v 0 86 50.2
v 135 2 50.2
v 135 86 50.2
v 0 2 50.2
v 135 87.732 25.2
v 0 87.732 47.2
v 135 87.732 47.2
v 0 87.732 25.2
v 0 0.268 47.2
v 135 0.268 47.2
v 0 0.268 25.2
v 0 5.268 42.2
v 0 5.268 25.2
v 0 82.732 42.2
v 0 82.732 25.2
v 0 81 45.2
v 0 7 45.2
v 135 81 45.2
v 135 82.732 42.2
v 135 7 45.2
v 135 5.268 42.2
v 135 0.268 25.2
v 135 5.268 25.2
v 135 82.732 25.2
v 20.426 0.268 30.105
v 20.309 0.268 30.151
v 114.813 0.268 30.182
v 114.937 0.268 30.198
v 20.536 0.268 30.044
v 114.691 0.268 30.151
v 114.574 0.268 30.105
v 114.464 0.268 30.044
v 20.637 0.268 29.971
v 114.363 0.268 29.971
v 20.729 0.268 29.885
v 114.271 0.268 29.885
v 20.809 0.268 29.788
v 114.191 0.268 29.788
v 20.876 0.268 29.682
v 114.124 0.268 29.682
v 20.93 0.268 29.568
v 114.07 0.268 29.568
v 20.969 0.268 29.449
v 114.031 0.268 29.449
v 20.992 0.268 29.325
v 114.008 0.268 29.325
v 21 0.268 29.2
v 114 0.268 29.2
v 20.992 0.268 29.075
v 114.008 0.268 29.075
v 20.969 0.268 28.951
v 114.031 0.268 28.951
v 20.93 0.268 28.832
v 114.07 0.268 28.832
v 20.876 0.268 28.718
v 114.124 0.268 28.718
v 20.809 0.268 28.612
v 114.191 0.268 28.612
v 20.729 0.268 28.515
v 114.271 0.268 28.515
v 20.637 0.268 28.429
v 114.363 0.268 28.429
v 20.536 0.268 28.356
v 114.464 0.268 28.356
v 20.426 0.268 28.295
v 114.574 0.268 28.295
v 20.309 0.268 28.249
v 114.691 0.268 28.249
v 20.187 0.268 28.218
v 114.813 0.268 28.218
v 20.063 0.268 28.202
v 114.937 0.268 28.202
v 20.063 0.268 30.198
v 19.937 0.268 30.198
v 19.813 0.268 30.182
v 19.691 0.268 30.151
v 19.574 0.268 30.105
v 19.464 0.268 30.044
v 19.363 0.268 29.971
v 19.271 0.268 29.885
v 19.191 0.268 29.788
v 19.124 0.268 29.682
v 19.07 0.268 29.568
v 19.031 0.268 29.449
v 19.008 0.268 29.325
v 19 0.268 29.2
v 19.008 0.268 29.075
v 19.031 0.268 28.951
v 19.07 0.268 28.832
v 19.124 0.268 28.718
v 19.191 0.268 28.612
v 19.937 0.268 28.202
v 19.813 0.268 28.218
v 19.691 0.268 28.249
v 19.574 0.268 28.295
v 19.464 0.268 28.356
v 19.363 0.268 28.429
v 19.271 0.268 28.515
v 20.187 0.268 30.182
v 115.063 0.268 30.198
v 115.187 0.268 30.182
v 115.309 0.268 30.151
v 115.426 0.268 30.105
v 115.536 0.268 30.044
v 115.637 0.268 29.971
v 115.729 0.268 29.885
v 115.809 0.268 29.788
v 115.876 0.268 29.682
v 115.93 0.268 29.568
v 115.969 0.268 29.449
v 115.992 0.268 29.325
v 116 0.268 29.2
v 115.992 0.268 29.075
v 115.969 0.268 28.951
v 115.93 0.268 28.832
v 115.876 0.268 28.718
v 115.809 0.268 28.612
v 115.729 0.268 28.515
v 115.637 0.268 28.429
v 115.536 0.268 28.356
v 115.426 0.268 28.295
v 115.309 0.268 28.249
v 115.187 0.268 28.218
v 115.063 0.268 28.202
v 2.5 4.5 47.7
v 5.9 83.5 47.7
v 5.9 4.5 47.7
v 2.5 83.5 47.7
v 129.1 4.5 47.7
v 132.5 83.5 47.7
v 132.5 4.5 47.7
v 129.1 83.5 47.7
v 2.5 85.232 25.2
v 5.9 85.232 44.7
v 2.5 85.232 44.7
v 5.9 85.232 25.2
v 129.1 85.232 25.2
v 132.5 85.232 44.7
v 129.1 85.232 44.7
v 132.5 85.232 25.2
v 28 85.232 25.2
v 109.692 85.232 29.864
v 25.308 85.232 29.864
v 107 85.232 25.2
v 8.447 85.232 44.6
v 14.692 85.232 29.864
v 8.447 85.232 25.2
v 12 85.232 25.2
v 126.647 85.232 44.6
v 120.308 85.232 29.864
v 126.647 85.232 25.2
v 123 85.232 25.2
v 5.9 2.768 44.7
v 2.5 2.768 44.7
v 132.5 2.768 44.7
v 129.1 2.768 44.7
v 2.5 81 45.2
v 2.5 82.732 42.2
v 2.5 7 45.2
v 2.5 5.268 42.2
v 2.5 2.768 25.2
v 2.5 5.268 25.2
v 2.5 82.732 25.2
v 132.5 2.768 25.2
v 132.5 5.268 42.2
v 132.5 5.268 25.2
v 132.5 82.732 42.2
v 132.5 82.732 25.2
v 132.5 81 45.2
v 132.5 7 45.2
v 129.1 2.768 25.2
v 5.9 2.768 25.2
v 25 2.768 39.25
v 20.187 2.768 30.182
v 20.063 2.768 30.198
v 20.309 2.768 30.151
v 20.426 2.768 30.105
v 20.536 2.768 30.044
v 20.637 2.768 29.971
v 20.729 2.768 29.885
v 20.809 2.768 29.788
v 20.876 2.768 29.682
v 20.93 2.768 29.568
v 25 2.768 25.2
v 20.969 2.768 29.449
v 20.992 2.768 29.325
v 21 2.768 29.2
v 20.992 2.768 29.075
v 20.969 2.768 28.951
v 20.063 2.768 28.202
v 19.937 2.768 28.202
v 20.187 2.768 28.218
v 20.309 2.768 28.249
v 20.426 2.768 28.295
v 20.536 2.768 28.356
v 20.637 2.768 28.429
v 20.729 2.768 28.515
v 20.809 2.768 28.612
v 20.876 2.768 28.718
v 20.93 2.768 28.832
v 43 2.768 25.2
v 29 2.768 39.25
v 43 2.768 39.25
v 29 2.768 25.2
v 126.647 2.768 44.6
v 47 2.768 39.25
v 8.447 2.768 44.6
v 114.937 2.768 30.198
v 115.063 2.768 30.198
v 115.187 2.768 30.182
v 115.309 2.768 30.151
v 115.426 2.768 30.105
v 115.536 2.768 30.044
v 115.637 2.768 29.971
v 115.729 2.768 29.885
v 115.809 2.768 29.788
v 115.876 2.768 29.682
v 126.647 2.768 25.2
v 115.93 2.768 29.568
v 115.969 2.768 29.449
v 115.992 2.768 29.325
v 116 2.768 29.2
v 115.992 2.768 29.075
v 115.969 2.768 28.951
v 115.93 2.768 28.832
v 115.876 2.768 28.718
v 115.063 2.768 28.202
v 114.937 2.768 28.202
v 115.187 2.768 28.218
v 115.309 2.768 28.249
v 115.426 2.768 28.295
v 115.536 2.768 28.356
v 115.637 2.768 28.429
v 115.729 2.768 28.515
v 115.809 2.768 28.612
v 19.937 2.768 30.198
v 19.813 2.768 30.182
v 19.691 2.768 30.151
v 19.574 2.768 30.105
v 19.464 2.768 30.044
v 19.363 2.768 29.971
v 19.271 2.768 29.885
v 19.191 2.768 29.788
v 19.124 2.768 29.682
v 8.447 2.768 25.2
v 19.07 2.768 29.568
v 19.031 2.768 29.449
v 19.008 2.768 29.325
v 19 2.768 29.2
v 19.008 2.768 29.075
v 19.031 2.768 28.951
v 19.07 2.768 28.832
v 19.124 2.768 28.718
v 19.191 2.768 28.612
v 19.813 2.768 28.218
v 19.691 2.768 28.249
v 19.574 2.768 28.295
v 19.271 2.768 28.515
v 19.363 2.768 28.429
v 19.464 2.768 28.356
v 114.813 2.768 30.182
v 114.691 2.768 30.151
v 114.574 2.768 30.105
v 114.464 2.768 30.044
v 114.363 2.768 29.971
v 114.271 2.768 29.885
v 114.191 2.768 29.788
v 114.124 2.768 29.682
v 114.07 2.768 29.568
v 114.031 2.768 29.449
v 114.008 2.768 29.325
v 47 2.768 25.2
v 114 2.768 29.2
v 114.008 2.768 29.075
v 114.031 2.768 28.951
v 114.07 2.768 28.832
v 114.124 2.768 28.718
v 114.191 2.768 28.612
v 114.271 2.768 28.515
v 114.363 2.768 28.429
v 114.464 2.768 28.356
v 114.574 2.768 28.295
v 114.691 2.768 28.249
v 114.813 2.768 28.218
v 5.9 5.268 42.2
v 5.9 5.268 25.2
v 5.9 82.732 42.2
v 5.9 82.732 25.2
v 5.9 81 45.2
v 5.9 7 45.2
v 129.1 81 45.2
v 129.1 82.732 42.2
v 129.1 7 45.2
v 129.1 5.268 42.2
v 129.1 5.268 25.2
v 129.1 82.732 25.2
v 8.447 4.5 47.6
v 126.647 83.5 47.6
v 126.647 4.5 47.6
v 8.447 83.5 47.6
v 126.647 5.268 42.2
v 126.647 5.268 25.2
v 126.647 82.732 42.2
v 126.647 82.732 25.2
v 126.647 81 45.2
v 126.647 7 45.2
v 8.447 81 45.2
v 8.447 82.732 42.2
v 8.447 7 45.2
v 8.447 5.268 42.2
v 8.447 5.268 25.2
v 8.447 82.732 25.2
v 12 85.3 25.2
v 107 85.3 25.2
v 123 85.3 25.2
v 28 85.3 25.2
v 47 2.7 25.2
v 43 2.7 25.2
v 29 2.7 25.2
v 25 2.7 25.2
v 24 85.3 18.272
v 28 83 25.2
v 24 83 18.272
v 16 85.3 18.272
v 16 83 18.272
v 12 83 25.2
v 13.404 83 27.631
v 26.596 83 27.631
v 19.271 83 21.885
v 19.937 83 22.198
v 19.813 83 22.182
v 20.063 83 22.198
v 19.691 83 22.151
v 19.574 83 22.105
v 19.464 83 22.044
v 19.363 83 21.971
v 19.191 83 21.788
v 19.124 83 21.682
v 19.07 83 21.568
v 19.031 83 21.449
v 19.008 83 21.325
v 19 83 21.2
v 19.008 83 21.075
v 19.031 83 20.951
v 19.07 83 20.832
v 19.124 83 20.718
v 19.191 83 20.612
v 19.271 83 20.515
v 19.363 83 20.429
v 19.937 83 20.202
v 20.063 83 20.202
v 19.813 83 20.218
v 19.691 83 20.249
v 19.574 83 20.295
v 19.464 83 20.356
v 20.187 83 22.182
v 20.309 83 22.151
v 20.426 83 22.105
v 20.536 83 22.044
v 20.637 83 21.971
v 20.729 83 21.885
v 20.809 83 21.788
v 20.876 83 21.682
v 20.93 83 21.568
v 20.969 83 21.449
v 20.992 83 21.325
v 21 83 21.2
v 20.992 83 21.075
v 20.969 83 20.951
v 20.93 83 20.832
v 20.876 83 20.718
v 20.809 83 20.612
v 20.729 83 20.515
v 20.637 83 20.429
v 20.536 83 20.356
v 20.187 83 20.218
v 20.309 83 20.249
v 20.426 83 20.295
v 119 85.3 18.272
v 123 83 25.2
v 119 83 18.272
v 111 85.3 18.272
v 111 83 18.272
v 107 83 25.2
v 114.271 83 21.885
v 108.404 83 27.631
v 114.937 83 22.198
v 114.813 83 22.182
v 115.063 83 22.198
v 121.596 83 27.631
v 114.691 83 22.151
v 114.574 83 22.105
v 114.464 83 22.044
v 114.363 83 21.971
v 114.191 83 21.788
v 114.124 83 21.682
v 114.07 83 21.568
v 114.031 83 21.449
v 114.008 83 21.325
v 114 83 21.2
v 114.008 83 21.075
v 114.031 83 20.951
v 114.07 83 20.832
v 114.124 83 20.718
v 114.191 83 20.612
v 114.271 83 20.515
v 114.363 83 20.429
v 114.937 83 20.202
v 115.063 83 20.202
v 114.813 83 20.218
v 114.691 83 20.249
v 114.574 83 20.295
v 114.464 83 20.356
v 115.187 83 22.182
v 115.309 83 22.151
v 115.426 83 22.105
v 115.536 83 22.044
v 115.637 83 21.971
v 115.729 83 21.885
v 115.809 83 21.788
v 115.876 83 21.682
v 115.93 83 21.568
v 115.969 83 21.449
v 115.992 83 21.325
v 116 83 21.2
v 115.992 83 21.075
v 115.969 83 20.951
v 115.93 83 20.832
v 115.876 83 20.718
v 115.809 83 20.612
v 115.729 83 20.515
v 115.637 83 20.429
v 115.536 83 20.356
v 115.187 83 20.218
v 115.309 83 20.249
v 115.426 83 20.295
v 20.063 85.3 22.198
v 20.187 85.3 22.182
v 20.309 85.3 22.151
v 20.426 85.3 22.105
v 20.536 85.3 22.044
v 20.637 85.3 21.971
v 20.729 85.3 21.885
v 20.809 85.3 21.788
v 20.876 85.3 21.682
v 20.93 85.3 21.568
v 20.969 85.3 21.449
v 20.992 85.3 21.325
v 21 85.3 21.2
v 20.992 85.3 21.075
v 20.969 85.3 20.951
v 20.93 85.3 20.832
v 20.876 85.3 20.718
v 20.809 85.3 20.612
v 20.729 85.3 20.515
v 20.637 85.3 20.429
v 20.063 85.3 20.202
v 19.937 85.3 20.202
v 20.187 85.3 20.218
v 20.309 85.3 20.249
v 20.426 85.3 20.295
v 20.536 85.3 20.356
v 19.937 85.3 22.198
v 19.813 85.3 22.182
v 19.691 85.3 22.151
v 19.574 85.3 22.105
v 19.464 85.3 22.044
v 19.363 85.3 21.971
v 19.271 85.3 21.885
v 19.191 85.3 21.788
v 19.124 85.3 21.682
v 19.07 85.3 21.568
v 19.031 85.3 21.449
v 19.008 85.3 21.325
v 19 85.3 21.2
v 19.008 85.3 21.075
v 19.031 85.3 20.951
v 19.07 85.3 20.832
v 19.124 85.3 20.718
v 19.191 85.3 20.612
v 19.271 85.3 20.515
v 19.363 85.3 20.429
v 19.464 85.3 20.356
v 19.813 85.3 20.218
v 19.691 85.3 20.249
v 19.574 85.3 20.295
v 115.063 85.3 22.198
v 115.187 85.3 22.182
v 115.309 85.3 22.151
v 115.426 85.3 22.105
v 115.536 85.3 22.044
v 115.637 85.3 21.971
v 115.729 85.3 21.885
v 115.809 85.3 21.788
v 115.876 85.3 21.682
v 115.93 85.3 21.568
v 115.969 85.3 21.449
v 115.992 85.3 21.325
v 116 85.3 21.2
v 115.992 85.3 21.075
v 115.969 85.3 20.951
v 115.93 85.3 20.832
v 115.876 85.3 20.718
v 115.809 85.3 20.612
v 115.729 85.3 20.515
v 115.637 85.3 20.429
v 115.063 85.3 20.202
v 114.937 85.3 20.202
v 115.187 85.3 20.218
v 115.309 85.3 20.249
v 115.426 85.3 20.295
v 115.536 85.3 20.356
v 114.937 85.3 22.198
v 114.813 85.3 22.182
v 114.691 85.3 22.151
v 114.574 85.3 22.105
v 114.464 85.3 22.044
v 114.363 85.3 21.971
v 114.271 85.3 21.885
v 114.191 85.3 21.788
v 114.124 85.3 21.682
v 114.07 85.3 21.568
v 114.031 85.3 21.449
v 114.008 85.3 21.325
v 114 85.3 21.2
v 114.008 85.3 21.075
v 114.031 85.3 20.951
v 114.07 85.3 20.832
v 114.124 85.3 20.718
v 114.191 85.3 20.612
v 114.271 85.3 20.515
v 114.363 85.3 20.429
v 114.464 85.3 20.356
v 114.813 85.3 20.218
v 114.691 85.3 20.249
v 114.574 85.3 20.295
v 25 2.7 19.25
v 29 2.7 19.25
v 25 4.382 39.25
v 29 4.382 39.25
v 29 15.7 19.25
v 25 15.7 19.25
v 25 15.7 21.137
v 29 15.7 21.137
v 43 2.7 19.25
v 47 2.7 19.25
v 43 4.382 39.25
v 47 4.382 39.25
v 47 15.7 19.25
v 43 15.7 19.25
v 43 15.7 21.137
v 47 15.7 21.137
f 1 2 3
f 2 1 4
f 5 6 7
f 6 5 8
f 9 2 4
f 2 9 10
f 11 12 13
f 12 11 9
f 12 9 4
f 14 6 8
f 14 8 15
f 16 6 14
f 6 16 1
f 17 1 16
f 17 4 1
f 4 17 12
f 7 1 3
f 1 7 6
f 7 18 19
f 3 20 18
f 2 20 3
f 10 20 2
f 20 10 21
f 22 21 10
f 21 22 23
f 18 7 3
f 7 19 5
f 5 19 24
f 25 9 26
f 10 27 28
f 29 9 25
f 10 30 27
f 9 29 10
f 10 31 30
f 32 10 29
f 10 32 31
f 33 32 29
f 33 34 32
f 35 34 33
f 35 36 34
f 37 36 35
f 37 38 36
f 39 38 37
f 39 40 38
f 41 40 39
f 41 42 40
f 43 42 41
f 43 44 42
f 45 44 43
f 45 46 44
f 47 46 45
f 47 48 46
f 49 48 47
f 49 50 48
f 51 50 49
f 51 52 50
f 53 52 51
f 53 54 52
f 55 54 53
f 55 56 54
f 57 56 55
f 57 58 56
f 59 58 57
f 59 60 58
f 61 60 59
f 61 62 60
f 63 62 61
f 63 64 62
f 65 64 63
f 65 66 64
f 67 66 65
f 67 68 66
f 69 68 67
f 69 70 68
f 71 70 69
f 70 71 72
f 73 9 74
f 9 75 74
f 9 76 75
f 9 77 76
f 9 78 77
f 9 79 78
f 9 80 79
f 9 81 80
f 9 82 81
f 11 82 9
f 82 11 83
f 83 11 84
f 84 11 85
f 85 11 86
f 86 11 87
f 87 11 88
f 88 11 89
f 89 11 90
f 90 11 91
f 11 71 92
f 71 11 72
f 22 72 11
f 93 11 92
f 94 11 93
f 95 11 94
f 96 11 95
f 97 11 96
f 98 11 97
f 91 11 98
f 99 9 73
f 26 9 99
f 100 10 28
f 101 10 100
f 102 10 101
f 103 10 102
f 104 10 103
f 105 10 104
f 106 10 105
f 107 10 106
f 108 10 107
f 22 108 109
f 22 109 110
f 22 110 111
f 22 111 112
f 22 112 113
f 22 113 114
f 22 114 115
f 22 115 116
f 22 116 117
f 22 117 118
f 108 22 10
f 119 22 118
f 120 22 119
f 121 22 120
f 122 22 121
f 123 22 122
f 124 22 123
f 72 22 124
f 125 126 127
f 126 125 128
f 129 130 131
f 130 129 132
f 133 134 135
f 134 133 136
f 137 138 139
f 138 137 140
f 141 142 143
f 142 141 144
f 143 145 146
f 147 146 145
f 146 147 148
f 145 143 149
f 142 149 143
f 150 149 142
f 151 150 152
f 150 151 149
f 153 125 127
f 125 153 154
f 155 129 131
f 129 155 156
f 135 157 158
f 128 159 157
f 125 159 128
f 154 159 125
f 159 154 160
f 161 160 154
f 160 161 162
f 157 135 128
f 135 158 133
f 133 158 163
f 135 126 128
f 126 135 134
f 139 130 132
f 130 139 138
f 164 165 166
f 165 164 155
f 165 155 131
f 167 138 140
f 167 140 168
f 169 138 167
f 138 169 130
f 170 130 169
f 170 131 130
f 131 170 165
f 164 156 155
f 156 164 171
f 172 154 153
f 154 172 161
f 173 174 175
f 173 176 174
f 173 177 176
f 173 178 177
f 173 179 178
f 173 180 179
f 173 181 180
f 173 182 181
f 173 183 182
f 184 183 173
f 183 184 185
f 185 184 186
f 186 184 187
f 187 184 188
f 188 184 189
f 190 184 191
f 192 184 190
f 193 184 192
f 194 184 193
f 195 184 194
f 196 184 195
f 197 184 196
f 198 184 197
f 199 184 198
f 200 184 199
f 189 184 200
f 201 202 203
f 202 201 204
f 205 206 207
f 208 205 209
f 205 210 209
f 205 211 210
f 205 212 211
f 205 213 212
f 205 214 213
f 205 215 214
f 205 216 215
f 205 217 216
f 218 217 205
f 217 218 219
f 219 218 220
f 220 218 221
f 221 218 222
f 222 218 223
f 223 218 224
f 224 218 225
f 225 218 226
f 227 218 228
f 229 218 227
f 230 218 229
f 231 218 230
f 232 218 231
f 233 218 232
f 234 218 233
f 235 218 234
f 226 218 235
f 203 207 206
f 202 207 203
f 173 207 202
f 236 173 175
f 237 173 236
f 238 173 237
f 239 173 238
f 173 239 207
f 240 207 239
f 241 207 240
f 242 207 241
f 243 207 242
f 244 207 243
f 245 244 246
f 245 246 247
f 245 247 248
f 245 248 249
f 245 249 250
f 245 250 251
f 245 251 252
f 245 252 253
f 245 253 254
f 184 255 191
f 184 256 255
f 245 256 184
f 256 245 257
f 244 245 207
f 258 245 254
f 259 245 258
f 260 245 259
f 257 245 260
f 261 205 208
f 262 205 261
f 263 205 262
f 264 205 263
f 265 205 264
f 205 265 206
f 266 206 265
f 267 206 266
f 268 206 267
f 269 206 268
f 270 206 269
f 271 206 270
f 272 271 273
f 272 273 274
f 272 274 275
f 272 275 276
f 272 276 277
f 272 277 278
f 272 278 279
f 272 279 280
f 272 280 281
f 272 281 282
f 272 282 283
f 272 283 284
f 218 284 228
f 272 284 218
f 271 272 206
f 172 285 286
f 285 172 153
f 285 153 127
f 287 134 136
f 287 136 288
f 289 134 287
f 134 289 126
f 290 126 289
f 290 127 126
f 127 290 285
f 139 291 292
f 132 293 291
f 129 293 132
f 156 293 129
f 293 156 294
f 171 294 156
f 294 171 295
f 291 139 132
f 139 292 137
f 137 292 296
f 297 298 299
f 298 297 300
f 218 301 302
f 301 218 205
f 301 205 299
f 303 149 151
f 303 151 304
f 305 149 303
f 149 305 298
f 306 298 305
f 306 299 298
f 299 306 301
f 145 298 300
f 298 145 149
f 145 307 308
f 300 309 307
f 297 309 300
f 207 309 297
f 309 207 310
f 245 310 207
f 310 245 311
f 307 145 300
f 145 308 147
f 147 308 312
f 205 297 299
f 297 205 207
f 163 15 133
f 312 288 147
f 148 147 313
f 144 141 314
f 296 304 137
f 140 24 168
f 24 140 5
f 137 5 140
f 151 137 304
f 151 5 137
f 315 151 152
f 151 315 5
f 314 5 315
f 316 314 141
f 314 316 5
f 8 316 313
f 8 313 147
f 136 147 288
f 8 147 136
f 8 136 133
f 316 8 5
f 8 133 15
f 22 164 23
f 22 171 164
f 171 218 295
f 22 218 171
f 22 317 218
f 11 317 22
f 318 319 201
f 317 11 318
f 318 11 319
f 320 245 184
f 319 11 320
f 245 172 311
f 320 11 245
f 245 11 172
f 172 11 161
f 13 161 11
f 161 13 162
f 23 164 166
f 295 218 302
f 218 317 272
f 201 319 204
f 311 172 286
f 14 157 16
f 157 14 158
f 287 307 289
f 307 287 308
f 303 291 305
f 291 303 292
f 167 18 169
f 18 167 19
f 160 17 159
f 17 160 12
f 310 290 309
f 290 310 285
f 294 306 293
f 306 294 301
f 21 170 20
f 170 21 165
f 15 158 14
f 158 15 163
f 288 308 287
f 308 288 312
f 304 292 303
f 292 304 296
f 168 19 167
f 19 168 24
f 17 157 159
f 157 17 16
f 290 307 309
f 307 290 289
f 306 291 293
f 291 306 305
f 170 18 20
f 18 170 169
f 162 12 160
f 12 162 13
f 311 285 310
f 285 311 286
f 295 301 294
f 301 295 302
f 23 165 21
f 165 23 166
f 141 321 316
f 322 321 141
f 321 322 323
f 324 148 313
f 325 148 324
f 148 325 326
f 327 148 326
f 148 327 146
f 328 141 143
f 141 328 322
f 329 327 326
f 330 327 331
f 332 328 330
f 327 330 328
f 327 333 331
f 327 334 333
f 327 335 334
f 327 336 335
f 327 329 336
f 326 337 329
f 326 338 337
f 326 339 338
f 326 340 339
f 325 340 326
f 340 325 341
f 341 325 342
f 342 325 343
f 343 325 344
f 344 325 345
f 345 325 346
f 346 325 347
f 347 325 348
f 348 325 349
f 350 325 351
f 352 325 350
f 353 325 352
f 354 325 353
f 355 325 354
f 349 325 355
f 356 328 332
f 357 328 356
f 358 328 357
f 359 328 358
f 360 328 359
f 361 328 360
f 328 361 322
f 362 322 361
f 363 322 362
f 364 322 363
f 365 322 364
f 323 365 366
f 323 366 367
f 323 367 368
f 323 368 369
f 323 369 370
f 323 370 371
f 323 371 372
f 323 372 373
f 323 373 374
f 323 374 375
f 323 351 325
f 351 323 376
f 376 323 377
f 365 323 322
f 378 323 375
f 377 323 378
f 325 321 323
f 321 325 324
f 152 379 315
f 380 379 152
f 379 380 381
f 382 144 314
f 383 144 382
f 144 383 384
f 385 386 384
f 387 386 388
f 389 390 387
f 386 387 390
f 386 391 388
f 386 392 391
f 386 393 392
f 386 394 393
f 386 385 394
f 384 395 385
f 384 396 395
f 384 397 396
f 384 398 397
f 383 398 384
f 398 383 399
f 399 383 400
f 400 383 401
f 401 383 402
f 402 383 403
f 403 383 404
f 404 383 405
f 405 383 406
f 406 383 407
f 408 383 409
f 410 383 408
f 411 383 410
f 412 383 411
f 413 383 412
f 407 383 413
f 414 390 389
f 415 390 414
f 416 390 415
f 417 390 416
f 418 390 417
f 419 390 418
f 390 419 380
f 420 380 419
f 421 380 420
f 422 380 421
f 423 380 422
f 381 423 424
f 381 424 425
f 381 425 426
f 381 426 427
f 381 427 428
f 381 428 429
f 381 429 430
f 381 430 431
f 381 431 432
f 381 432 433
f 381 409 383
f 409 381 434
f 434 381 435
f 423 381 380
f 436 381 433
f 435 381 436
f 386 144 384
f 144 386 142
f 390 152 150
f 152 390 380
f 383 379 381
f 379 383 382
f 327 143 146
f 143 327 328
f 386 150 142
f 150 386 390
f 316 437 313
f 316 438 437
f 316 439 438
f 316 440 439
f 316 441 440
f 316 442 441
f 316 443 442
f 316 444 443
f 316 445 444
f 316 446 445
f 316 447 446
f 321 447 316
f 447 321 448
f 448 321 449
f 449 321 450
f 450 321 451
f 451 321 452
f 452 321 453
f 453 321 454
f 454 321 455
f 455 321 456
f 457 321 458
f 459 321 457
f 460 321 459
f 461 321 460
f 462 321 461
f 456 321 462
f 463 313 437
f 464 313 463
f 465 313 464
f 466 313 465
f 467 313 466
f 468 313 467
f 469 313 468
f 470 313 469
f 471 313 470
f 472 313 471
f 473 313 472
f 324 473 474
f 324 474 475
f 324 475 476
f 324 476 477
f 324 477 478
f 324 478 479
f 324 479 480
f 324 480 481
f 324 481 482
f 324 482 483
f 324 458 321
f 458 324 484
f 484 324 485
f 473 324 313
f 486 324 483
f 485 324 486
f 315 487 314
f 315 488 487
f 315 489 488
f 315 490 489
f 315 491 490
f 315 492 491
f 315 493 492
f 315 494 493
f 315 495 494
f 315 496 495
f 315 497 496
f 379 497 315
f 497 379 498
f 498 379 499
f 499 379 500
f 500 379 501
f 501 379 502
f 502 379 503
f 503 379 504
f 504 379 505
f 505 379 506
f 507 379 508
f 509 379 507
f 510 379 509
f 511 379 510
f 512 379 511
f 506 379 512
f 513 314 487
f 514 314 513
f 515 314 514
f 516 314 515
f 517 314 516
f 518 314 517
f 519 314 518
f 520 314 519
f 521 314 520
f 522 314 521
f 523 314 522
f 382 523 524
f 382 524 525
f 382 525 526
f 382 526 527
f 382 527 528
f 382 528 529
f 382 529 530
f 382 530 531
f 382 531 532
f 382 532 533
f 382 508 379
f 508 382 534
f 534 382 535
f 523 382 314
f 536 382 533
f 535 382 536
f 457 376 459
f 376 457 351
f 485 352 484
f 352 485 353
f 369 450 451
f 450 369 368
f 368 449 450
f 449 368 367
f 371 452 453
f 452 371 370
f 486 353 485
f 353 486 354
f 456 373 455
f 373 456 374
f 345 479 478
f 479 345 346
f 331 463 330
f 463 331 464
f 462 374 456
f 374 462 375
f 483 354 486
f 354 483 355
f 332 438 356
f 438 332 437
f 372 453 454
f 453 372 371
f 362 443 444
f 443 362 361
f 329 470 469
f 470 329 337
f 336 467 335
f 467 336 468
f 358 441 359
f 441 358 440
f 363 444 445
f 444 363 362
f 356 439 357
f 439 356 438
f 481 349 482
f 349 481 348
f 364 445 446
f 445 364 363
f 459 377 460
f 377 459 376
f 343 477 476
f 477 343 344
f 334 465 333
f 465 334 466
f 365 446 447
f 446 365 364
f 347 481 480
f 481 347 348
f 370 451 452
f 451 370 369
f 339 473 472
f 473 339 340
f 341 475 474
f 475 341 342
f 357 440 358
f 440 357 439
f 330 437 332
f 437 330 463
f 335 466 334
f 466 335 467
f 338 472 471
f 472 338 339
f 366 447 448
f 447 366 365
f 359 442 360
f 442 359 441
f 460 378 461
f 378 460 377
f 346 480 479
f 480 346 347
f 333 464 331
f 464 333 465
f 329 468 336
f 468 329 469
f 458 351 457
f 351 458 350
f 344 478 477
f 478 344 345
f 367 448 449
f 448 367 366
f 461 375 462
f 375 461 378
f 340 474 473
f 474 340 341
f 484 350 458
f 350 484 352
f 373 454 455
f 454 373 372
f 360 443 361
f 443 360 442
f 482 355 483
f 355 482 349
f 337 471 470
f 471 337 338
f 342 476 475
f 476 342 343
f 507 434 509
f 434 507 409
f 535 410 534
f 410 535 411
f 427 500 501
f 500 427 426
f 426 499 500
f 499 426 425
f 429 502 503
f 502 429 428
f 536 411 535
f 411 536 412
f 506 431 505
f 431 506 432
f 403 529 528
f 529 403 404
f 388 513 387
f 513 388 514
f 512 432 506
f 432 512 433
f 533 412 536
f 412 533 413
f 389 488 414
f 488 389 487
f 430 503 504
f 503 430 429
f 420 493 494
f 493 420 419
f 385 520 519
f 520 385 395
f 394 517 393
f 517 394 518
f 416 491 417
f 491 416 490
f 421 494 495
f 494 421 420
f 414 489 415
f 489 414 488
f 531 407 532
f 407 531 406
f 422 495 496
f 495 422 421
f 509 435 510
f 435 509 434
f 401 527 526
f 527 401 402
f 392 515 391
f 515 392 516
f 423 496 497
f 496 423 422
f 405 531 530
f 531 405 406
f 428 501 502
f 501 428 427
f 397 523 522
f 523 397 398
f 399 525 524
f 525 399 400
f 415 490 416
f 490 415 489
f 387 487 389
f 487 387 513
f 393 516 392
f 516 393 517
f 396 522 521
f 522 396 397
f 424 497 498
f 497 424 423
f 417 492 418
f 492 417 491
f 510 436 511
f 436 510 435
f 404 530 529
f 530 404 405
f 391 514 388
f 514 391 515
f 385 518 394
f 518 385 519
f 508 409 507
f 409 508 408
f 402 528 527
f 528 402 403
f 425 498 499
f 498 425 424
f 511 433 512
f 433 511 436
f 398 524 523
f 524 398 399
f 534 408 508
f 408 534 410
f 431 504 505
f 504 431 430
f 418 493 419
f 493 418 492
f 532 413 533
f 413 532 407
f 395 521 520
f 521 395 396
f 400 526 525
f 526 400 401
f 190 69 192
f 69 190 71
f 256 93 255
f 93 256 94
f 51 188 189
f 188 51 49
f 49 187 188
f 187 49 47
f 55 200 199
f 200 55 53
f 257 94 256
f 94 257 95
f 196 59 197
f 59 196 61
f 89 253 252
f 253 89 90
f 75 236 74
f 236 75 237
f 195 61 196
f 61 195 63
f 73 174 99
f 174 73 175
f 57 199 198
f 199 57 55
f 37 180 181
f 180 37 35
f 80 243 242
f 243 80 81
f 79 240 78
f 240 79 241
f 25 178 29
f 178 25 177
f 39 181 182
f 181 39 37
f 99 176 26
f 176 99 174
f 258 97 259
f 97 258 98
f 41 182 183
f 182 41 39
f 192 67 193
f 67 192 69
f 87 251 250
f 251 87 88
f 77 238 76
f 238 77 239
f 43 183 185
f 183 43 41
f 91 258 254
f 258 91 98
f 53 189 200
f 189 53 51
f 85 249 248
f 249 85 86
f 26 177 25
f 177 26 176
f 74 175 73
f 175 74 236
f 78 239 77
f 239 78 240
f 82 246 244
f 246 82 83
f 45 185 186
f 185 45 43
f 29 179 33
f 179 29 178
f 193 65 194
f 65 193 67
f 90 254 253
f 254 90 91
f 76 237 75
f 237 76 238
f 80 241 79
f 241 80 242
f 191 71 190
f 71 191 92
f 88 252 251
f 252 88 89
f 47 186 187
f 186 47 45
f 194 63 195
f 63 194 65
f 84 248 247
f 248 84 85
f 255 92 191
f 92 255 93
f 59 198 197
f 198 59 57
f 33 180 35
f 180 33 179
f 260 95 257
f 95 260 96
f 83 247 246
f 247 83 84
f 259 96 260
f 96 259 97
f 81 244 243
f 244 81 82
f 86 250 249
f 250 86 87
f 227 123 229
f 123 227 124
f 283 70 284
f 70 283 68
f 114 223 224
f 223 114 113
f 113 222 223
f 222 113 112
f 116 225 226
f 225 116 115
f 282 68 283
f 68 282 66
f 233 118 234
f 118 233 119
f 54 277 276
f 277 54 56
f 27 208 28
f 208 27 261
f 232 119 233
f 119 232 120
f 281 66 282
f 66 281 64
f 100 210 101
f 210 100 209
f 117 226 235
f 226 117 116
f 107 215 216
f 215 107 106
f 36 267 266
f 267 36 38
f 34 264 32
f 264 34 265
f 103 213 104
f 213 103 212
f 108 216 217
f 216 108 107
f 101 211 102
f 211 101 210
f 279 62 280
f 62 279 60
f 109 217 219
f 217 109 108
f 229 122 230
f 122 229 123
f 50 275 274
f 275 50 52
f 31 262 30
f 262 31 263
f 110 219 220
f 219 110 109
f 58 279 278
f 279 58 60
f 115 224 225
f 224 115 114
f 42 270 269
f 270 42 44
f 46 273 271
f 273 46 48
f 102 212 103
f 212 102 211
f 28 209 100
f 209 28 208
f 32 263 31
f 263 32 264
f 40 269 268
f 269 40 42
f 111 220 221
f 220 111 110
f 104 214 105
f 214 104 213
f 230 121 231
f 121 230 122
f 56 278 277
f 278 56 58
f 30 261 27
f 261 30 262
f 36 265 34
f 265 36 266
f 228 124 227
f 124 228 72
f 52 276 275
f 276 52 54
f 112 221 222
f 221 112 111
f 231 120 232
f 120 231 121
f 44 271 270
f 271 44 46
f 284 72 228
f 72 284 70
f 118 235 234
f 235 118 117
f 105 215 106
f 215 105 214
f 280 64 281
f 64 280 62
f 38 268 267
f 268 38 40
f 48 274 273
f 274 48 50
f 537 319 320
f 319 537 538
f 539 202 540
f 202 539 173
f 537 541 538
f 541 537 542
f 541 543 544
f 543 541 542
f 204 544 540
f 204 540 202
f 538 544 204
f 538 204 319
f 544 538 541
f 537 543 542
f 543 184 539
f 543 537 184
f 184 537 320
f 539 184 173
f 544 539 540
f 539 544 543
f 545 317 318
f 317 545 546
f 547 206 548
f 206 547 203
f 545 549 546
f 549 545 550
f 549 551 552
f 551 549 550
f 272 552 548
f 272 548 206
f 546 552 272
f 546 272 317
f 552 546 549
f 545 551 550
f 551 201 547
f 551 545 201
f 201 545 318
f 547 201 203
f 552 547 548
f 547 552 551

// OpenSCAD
/*//////////////////////////////////////////////////////////////////
              -    FB Aka Heartman/Hearty 2016     -                   
              -   http://heartygfx.blogspot.com    -                  
              -       OpenScad Parametric Box      -                     
              -         CC BY-NC 3.0 License       -                      
////////////////////////////////////////////////////////////////////                                                                                                             
12/02/2016 - Fixed minor bug 
28/02/2016 - Added holes ventilation option                    
09/03/2016 - Added PCB feet support, fixed the shell artefact on export mode. 

*/ ////////////////////////// - Info - //////////////////////////////

// All coordinates are starting as integrated circuit pins.
// From the top view :

//   CoordD           <---       CoordC
//                                 ^
//                                 ^
//                                 ^
//   CoordA           --->       CoordB

////////////////////////////////////////////////////////////////////

/////////////////////////// - Box parameters - //////////////////////

/* [Box dimensions] */
// - Longueur - Length  
Length = 135;
// - Largeur - Width
Width = 88;
// - Hauteur - Height  
Height = 50;
// - Epaisseur - Wall thickness  
Thick = 2.5; //[2:5]  

/* [Box options] */
// - DiamÃ¨tre Coin arrondi - Filet diameter  
Filet = 2; //[0.1:12] 
// - lissage de l'arrondi - Filet smoothness  
Resolution = 1; //[1:100] 
// - TolÃ©rance - Tolerance (Panel/rails gap)
m = 0.9;
// Pieds PCB - PCB feet (x4) 
PCBFeet = 0; // [0:No, 1:Yes]
// - Decorations to ventilation holes
Vent = 0; // [0:No, 1:Yes]
// - Decoration-Holes width (in mm)
Vent_width = 0;

/////////////////////////// - PCB parameters - //////////////////////

/* [PCB_Feet] */
//All dimensions are from the center foot axis

// - Coin bas gauche - Low left corner X position
PCBPosX = 0;
// - Coin bas gauche - Low left corner Y position
PCBPosY = 0;
// - Longueur PCB - PCB Length
PCBLength = 0;
// - Largeur PCB - PCB Width
PCBWidth = 0;
// - Heuteur pied - Feet height
FootHeight = 0;
// - DiamÃ¨tre pied - Foot diameter
FootDia = 0;
// - DiamÃ¨tre trou - Hole diameter
FootHole = 0;

/* [STL element to export] */
//Coque haut - Top shell
TShell = 1; // [0:No, 1:Yes]
//Coque bas- Bottom shell
BShell = 0; // [0:No, 1:Yes]
//Panneau avant - Front panel
FPanL = 0; // [0:No, 1:Yes]
//Panneau arriÃ¨re - Back panel  
BPanL = 0; // [0:No, 1:Yes]

/* [Hidden] */
// - Couleur coque - Shell color  
Couleur1 = "Orange";
// - Couleur panneaux - Panels color    
Couleur2 = "OrangeRed";
// Thick X 2 - making decorations thicker if it is a vent to make sure they go through shell
Dec_Thick = Vent ? Thick * 2 : Thick;
// - Depth decoration
Dec_size = Vent ? Thick * 2 : 0.8;

////////////////// - Generic rounded box - ///////////////

module RoundBox($a = Length, $b = Width, $c = Height) { // Cube bords arrondis
  $fn = Resolution;
  translate([0, Filet, Filet]) {
    minkowski() {
      cube([$a - (Length / 2), $b - (2 * Filet), $c - (2 * Filet)], center = false);
      rotate([0, 90, 0]) {
        cylinder(r = Filet, h = Length / 2, center = false);
      }
    }
  }
} // End of RoundBox Module

////////////////////////////////// - Module Coque/Shell - //////////////////////////////////         

module Coque() { //Coque - Shell  
  Thick = Thick * 2;
  difference() {
    difference() { //sides decoration
      union() {
        difference() { //soustraction de la forme centrale - Substraction Fileted box

          difference() { //soustraction cube median - Median cube slicer
            union() { //union               
              difference() { //Coque    
                RoundBox();
                translate([Thick / 2, Thick / 2, Thick / 2]) {
                  RoundBox($a = Length - Thick, $b = Width - Thick, $c = Height - Thick);
                }
              } //Fin diff Coque                            
              difference() { //largeur Rails        
                translate([Thick + m, Thick / 2, Thick / 2]) { // Rails
                  RoundBox($a = Length - ((2 * Thick) + (2 * m)), $b = Width - Thick, $c = Height - (Thick * 2));
                } //fin Rails
                translate([((Thick + m / 2) * 1.55), Thick / 2, Thick / 2 + 0.1]) { // +0.1 added to avoid the artefact
                  RoundBox($a = Length - ((Thick * 3) + 2 * m), $b = Width - Thick, $c = Height - Thick);
                }
              } //Fin largeur Rails
            } //Fin union                                   
            translate([-Thick, -Thick, Height / 2]) { // Cube Ã  soustraire
              cube([Length + 100, Width + 100, Height], center = false);
            }
          } //fin soustraction cube median - End Median cube slicer
          translate([-Thick / 2, Thick, Thick]) { // Forme de soustraction centrale 
            RoundBox($a = Length + Thick, $b = Width - Thick * 2, $c = Height - Thick);
          }
        }

        difference() { // wall fixation box legs
          union() {
            translate([3 * Thick + 5, Thick, Height / 2]) {
              rotate([90, 0, 0]) {
                $fn = 6;
                cylinder(d = 16, Thick / 2);
              }
            }

            translate([Length - ((3 * Thick) + 5), Thick, Height / 2]) {
              rotate([90, 0, 0]) {
                $fn = 6;
                cylinder(d = 16, Thick / 2);
              }
            }

          }
          translate([4, Thick + Filet, Height / 2 - 57]) {
            rotate([45, 0, 0]) {
              cube([Length, 40, 40]);
            }
          }
          translate([0, -(Thick * 1.46), Height / 2]) {
            cube([Length, Thick * 2, 10]);
          }
        } //Fin fixation box legs
      }

      union() { // outbox sides decorations

        for (i = [0: Thick: Length / 4]) {

          // Ventilation holes part code submitted by Ettie - Thanks ;) 
          translate([10 + i, -Dec_Thick + Dec_size, 1]) {
            cube([Vent_width, Dec_Thick, Height / 4]);
          }
          translate([(Length - 10) - i, -Dec_Thick + Dec_size, 1]) {
            cube([Vent_width, Dec_Thick, Height / 4]);
          }
          translate([(Length - 10) - i, Width - Dec_size, 1]) {
            cube([Vent_width, Dec_Thick, Height / 4]);
          }
          translate([10 + i, Width - Dec_size, 1]) {
            cube([Vent_width, Dec_Thick, Height / 4]);
          }

        } // fin de for
        // }
      } //fin union decoration
    } //fin difference decoration

    union() { //sides holes
      $fn = 50;
      translate([3 * Thick + 5, 20, Height / 2 + 4]) {
        rotate([90, 0, 0]) {
          cylinder(d = 2, 20);
        }
      }
      translate([Length - ((3 * Thick) + 5), 20, Height / 2 + 4]) {
        rotate([90, 0, 0]) {
          cylinder(d = 2, 20);
        }
      }
      translate([3 * Thick + 5, Width + 5, Height / 2 - 4]) {
        rotate([90, 0, 0]) {
          cylinder(d = 2, 20);
        }
      }
      translate([Length - ((3 * Thick) + 5), Width + 5, Height / 2 - 4]) {
        rotate([90, 0, 0]) {
          cylinder(d = 2, 20);
        }
      }
    } //fin de sides holes

  } //fin de difference holes
} // fin coque 

////////////////////////////// - Experiment - ///////////////////////////////////////////

/////////////////////// - Foot with base filet - /////////////////////////////
module foot(FootDia, FootHole, FootHeight) {
  Filet = 2;
  color(Couleur1)
  translate([0, 0, Filet - 1.5])
  difference() {

    difference() {
      //translate ([0,0,-Thick]){
      cylinder(d = FootDia + Filet, FootHeight - Thick, $fn = 100);
      //}
      rotate_extrude($fn = 100) {
        translate([(FootDia + Filet * 2) / 2, Filet, 0]) {
          minkowski() {
            square(10);
            circle(Filet, $fn = 100);
          }
        }
      }
    }
    cylinder(d = FootHole, FootHeight + 1, $fn = 100);
  }
} // Fin module foot

module Feet() {
  //////////////////// - PCB only visible in the preview mode - /////////////////////    
  translate([3 * Thick + 2, Thick + 5, FootHeight + (Thick / 2) - 0.5]) {

    %
    square([PCBLength + 10, PCBWidth + 10]);
    translate([PCBLength / 2, PCBWidth / 2, 0.5]) {
      color("Olive") %
        text("PCB", halign = "center", valign = "center", font = "Arial black");
    }
  } // Fin PCB 

  ////////////////////////////// - 4 Feet - //////////////////////////////////////////     
  translate([3 * Thick + 7, Thick + 10, Thick / 2]) {
    foot(FootDia, FootHole, FootHeight);
  }
  translate([(3 * Thick) + PCBLength + 7, Thick + 10, Thick / 2]) {
    foot(FootDia, FootHole, FootHeight);
  }
  translate([(3 * Thick) + PCBLength + 7, (Thick) + PCBWidth + 10, Thick / 2]) {
    foot(FootDia, FootHole, FootHeight);
  }
  translate([3 * Thick + 7, (Thick) + PCBWidth + 10, Thick / 2]) {
    foot(FootDia, FootHole, FootHeight);
  }

} // Fin du module Feet

////////////////////////////////////////////////////////////////////////
////////////////////// <- Holes Panel Manager -> ///////////////////////
////////////////////////////////////////////////////////////////////////

//                           <- Panel ->  
module Panel(Length, Width, Thick, Filet) {
  scale([0.5, 1, 1])
  minkowski() {
    cube([Thick, Width - (Thick * 2 + Filet * 2 + m), Height - (Thick * 2 + Filet * 2 + m)]);
    translate([0, Filet, Filet])
    rotate([0, 90, 0])
    cylinder(r = Filet, h = Thick, $fn = 100);
  }
}

//                          <- Circle hole -> 
// Cx=Cylinder X position | Cy=Cylinder Y position | Cdia= Cylinder dia | Cheight=Cyl height
module CylinderHole(OnOff, Cx, Cy, Cdia) {
  if (OnOff == 1)
    translate([Cx, Cy, -1])
  cylinder(d = Cdia, 10, $fn = 50);
}
//                          <- Square hole ->  
// Sx=Square X position | Sy=Square Y position | Sl= Square Length | Sw=Square Width | Filet = Round corner
module SquareHole(OnOff, Sx, Sy, Sl, Sw, Filet) {
  if (OnOff == 1)
    minkowski() {
      translate([Sx + Filet / 2, Sy + Filet / 2, -1])
      cube([Sl - Filet, Sw - Filet, 10]);
      cylinder(d = Filet, h = 10, $fn = 100);
    }
}

//                      <- Linear text panel -> 
module LText(OnOff, Tx, Ty, Font, Size, Content) {
  if (OnOff == 0)
    translate([Tx, Ty, Thick + .5])
  linear_extrude(height = 0.5) {
    text(Content, size = Size, font = Font);
  }
}
//                     <- Circular text panel->  
module CText(OnOff, Tx, Ty, Font, Size, TxtRadius, Angl, Turn, Content) {
  if (OnOff == 0) {
    Angle = -Angl / len(Content);
    translate([Tx, Ty, Thick + .5])
    for (i = [0: len(Content) - 1]) {
      rotate([0, 0, i * Angle + 90 + Turn])
      translate([0, TxtRadius, 0]) {
        linear_extrude(height = 0.5) {
          text(Content[i], font = Font, size = Size, valign = "baseline", halign = "center");
        }
      }
    }
  }
}
////////////////////// <- New module Panel -> //////////////////////
module FPanL() {
  difference() {
    color(Couleur2)
    Panel(Length, Width, Thick, Filet);

    rotate([90, 0, 90]) {
      color(Couleur2) {

        //////////////////////// <- Hole Specifications -> //////////////////////

        SquareHole(0, 20, 20, 15, 10, 1); //(On/Off, Xpos,Ypos,Length,Width,Filet)
        SquareHole(0, 40, 20, 15, 10, 1);
        SquareHole(0, 60, 20, 15, 10, 1);
        CylinderHole(0, 27, 40, 8); //(On/Off, Xpos, Ypos, Diameter)
        CylinderHole(1, 30.5, 23, 11.8);
        CylinderHole(1, 49.5, 23, 11.8);
        SquareHole(0, 20, 50, 80, 30, 3);
        CylinderHole(0, 93, 30, 10);
        SquareHole(0, 120, 20, 30, 60, 3);
        //                            <- To here -> 
      }
    }
  }

  color(Couleur1) {
    translate([-.5, 0, 0])
    rotate([90, 0, 90]) {

      //                      <- Adding text from here ->          
      LText(1, 20, 83, "Arial Black", 4, "Digital Screen"); //(On/Off, Xpos, Ypos, "Font", Size, "Text")
      LText(1, 120, 83, "Arial Black", 4, "Level");
      LText(1, 20, 11, "Arial Black", 6, "  1     2      3");
      CText(1, 93, 29, "Arial Black", 4, 10, 180, 0, "1 . 2 . 3 . 4 . 5 . 6"); //(On/Off, Xpos, Ypos, "Font", Size, Diameter, Arc(Deg), Starting Angle(Deg),"Text")
      //                            <- To here ->
    }
  }
}

/////////////////////////// <- Main part -> /////////////////////////


difference(){ //Subtract additional Geometries from box
    union(){  //Add addtional Geometries to box
  if (TShell == 1)
    // Coque haut - Top Shell
    color(Couleur1, 1) {
      translate([0, Width, Height + 0.2]) {
        rotate([0, 180, 180]) {
          Coque();
        }
      }
    }

  if (BShell == 1)
    // Coque bas - Bottom shell
    color(Couleur1) {
      Coque();
    }

  // Pied support PCB - PCB feet
  if (PCBFeet == 1)
    // Feet
    translate([PCBPosX, PCBPosY, 0]) {
      Feet();
    }

  // Panneau avant - Front panel  <<<<<< Text and holes only on this one.
  //rotate([0,-90,-90]) 
  if (FPanL == 1)
    translate([Length - (Thick * 2 + m / 2), Thick + m / 2, Thick + m / 2])
  FPanL();

  //Panneau arriÃ¨re - Back panel
  if (BPanL == 1)
    color(Couleur2)
  translate([Thick + m / 2, Thick + m / 2, Thick + m / 2])
  Panel(Length, Width, Thick, Filet);


///////////////////Added Geometries////////////////
  
////////////////////// Battey /////////////////////
/*
translate([8.5, 3, 2.5]){
  color([0.2,0.4,1]) {
    cube([50, 26, 16.5], center=false);
  }
}
*/
//////////////////// End Battey ///////////////////

///////////////////Start Union Geometries//////////
 // Battery holder Bottom Shell
  rotate([0, 0, 270]){
  // Sets position of both brackets
  translate([-15.7, 25, 19.25]){
    union(){
      translate([0, 18, 0]){
        difference() {
          cube([13, 4, 20], center=false);

          color([1,0.8,0]) {
            rotate([0, 32, 0]){
              translate([-14, -.25, 0]){
                cube([13, 4.5, 25], center=false);
              }
            }
          }
        }
      }
      difference() {
        cube([13, 4, 20], center=false);

        color([1,0.8,0]) {
          rotate([0, 32, 0]){
            translate([-14, -.25, 0]){
              cube([13, 4.5, 25], center=false);
            }
          }
        }
      }
    }
  }
}

/*
translate([60.9, 31, 0]) { // Battery Cage
    rotate([0, 0, 180]) {
      difference() {

// Battery Cage Geometry
difference() {
  translate([0, -1.4, 0]){
    cube([54, 29.5, 16], center=false);
  }

  translate([2, .5, 0]){
    cube([54, 29.5, 16.1], center=false);
  }
  translate([-1.25, 25, -1]){
    rotate([315, 0, 0]){
      color([0.93,0,0]) {
        cube([4, 3, 8], center=false);
      }
    }
  }
}
// End Battery Cage Geometry
      }
    }
  }
*/
// End Battery Cage
  }
 /////////////////// End Union Geometries ///////////////
  
 ///////////////////Start Difference Geometries////////// 
  
  translate([135, 44, 0]) { //ESR Holes & Text
    rotate([0, 0, 90]) {
      translate([0, 4, 0]) {
        // Meter Cutout
        translate([0, 38, -5]) {
          color([0.2, 0.2, 1]) {
            {
              $fn = 100; //set sides to 100
              cylinder(r1 = 31, r2 = 31, h = 10, center = false);
            }
          }
          // Right Meter Mount
          translate([-32, -17, 0]) {
            color([1, 0.8, 0]) {
              {
                $fn = 100; //set sides to 100
                cylinder(r1 = 2, r2 = 2, h = 10, center = false);
              }
            }
          }
          // Left Meter Mount
          translate([32, -17, 0]) {
            color([1, 0.8, 0]) {
              {
                $fn = 100; //set sides to 100
                cylinder(r1 = 2, r2 = 2, h = 10, center = false);
              }
            }
          }
        }
        // Potentiometer Hole
        color([1, 0.8, 0]) {
          translate([0, 95, -5]) {
            {
              $fn = 100; //set sides to 100
              cylinder(r1 = 4, r2 = 4, h = 10, center = false);
            }
          }
        }
        // Potentiometer Guide Hole
        color([1, 0.8, 0]) {
          translate([11.5, 95, -5]) {
            {
              $fn = 100; //set sides to 100
              cylinder(r1 = 1.4, r2 = 1.4, h = 10, center = false);
            }
          }
        }
        // Zero Adjust Switch
        color([1, 0.8, 0]) {
          translate([24, 95, -5]) {
            {
              $fn = 100; //set sides to 100
              cylinder(r1 = 2.9, r2 = 2.9, h = 10, center = false);
            }
          }
        }
        // OFF Text
        color([1, 0, 0]) {
          rotate([0, 180, 0]) {
            translate([-30, 75, -.5]) {
              {
                linear_extrude(1)
                text("OFF",font="consolas:style=bold", size = 8);
              }
            }
          }
        }
      }
    }
  }
//End ESR Holes & Text

///////////////////End Difference Geometries/////////////
}
///////////////////End Added Geometries//////////////////
